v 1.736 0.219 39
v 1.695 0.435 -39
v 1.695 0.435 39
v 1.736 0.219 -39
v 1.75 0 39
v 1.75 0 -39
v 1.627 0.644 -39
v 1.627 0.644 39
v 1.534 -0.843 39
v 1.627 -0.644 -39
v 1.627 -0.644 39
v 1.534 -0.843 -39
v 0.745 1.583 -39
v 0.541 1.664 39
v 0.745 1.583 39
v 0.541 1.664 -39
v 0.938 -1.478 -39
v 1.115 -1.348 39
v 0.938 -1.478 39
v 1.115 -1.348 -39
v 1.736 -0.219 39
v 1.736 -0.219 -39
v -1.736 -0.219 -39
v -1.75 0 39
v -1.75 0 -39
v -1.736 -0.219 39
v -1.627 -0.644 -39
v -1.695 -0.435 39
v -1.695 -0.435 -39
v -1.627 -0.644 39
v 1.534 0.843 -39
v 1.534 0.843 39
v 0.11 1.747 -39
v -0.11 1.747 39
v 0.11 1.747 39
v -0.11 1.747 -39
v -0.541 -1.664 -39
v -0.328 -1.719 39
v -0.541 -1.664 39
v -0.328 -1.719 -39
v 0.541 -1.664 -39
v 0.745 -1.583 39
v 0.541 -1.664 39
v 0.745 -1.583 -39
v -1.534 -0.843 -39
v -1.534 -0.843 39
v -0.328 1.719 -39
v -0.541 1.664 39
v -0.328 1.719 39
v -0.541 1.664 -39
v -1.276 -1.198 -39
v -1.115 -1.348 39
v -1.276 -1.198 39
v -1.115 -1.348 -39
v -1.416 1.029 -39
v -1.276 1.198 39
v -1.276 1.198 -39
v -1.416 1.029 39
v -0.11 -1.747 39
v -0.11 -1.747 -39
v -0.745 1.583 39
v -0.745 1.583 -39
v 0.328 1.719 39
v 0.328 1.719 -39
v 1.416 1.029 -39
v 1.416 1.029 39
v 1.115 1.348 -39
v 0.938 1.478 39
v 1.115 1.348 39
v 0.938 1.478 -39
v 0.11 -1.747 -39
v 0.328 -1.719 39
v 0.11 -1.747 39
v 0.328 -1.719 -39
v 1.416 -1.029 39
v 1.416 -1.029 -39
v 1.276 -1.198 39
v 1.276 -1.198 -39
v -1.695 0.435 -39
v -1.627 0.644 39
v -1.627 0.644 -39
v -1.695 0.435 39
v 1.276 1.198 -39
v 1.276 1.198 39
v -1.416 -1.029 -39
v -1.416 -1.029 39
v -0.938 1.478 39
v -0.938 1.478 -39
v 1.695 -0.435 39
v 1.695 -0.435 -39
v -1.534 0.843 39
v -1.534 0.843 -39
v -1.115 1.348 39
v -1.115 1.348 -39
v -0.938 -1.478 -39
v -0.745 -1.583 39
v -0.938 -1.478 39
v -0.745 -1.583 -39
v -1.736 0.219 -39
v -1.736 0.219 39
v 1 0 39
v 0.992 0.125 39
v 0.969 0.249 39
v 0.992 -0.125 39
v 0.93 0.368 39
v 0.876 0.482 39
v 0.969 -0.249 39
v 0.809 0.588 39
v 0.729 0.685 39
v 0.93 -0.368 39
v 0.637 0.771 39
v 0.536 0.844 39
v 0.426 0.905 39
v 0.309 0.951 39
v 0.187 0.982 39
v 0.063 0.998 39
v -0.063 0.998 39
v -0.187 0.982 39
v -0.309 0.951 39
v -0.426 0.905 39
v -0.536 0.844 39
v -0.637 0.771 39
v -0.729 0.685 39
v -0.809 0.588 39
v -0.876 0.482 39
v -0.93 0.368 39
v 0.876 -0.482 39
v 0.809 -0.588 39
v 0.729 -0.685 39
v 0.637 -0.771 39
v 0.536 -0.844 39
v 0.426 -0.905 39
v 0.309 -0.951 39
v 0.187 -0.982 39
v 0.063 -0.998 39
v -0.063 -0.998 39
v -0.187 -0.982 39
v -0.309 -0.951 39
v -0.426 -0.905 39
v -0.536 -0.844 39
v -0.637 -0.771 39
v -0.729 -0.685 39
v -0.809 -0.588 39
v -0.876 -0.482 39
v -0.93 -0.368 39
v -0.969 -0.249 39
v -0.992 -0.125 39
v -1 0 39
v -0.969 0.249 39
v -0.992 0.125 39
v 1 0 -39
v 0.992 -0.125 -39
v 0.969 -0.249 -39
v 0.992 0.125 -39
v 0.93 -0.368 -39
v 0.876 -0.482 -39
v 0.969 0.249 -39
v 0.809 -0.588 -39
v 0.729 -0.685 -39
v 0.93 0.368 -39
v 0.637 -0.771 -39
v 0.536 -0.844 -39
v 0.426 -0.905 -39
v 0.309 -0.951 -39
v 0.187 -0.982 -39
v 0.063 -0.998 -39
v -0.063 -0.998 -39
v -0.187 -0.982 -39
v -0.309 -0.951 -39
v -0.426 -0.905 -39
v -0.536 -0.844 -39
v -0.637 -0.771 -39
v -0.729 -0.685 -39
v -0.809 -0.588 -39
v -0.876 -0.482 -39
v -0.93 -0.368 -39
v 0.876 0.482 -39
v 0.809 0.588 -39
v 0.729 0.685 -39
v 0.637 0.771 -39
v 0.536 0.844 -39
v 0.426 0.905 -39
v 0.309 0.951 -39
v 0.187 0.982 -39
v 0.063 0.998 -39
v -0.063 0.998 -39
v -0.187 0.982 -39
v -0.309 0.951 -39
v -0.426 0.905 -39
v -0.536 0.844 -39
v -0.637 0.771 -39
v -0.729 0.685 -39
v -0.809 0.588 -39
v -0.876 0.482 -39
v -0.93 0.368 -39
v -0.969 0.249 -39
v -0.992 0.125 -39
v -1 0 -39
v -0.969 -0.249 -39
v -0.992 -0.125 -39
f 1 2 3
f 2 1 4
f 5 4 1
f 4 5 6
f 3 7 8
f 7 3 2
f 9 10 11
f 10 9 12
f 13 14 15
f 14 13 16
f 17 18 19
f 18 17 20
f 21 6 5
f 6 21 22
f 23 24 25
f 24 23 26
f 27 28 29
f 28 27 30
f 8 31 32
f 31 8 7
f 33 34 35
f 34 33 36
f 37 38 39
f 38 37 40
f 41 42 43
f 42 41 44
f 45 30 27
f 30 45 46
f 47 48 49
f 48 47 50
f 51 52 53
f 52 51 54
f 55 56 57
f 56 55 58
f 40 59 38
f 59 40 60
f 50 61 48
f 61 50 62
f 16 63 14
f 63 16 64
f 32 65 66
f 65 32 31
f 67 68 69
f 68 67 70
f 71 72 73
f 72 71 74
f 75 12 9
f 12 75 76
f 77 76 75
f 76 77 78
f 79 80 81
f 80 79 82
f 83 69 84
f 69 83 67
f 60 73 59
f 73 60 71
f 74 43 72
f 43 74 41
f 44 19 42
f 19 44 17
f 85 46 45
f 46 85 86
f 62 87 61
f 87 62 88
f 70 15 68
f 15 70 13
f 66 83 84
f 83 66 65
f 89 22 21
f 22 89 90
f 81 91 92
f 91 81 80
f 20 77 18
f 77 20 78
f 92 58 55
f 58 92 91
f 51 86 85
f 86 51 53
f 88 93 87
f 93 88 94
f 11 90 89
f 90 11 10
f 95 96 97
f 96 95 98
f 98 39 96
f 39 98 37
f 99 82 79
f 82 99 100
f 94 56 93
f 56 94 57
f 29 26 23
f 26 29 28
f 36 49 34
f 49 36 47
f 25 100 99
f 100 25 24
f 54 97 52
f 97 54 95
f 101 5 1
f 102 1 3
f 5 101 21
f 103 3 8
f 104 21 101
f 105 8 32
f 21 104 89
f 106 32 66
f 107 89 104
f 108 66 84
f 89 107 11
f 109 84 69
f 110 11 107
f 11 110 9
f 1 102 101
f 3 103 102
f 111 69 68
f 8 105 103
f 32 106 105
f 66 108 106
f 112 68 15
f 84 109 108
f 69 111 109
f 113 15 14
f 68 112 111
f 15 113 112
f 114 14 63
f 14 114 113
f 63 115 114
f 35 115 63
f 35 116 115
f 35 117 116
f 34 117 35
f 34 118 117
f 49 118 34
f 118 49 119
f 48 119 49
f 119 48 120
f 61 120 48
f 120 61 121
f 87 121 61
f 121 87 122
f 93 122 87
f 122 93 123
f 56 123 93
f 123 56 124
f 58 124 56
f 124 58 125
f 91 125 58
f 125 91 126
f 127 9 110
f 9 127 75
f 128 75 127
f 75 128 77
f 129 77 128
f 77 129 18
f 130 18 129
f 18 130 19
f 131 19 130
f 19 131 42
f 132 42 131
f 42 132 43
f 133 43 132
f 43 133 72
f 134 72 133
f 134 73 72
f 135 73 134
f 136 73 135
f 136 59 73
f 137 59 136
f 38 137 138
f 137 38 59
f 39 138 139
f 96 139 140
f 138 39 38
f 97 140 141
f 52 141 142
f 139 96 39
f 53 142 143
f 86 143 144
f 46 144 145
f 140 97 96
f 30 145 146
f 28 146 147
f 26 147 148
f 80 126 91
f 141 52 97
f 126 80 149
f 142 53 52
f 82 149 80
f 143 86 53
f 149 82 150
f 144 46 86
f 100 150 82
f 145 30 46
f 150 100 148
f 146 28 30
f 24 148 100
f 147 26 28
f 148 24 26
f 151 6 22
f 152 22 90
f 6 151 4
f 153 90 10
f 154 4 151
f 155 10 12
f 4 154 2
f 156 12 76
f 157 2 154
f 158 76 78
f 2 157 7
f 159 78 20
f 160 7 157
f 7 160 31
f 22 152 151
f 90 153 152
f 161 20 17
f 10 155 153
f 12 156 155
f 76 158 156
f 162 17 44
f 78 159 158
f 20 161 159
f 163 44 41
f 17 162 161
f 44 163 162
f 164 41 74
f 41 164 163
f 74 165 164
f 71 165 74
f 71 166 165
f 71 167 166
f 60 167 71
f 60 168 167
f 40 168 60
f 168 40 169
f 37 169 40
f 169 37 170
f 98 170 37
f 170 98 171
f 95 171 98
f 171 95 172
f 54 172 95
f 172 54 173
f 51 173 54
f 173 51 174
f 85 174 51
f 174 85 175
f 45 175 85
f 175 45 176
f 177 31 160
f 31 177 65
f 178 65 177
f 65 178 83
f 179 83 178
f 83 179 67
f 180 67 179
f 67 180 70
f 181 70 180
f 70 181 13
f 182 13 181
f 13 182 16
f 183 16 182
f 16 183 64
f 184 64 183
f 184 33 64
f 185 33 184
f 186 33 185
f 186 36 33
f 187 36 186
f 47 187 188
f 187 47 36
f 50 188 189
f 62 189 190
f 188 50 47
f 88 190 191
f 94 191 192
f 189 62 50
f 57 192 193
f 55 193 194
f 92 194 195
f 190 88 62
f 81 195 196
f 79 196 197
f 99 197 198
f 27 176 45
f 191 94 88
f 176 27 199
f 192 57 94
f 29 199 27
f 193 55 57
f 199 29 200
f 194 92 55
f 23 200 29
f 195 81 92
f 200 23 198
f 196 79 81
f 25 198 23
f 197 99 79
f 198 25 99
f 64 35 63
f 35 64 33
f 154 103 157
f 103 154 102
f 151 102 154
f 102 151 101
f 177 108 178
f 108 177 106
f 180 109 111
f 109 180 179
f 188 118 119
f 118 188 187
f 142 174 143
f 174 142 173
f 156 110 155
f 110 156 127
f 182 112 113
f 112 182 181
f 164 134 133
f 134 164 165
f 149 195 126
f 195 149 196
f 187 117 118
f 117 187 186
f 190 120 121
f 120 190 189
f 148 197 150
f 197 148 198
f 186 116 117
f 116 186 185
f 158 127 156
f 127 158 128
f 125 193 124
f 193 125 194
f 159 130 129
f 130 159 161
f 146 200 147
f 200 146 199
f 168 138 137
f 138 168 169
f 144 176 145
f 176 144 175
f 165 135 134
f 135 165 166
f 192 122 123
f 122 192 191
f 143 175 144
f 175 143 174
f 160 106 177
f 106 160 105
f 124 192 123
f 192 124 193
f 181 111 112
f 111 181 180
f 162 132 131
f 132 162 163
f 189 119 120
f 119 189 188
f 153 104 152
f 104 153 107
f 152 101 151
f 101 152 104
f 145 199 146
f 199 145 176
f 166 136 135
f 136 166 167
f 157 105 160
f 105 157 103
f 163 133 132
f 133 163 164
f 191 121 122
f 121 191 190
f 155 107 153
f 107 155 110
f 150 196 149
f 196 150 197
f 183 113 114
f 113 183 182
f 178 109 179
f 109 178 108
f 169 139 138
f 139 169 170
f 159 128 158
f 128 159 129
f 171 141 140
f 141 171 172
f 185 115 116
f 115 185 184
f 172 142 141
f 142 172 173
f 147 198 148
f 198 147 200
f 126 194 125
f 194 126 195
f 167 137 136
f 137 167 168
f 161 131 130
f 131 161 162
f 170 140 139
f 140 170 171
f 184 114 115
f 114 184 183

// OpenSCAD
$fn = 50;


difference() {
	union() {
		translate(v = [0, 0, -39.0000000000]) {
			cylinder(h = 78, r = 1.7500000000);
		}
	}
	union() {
		translate(v = [0, 0, -100.0000000000]) {
			cylinder(h = 200, r = 1.0000000000);
		}
	}
}
